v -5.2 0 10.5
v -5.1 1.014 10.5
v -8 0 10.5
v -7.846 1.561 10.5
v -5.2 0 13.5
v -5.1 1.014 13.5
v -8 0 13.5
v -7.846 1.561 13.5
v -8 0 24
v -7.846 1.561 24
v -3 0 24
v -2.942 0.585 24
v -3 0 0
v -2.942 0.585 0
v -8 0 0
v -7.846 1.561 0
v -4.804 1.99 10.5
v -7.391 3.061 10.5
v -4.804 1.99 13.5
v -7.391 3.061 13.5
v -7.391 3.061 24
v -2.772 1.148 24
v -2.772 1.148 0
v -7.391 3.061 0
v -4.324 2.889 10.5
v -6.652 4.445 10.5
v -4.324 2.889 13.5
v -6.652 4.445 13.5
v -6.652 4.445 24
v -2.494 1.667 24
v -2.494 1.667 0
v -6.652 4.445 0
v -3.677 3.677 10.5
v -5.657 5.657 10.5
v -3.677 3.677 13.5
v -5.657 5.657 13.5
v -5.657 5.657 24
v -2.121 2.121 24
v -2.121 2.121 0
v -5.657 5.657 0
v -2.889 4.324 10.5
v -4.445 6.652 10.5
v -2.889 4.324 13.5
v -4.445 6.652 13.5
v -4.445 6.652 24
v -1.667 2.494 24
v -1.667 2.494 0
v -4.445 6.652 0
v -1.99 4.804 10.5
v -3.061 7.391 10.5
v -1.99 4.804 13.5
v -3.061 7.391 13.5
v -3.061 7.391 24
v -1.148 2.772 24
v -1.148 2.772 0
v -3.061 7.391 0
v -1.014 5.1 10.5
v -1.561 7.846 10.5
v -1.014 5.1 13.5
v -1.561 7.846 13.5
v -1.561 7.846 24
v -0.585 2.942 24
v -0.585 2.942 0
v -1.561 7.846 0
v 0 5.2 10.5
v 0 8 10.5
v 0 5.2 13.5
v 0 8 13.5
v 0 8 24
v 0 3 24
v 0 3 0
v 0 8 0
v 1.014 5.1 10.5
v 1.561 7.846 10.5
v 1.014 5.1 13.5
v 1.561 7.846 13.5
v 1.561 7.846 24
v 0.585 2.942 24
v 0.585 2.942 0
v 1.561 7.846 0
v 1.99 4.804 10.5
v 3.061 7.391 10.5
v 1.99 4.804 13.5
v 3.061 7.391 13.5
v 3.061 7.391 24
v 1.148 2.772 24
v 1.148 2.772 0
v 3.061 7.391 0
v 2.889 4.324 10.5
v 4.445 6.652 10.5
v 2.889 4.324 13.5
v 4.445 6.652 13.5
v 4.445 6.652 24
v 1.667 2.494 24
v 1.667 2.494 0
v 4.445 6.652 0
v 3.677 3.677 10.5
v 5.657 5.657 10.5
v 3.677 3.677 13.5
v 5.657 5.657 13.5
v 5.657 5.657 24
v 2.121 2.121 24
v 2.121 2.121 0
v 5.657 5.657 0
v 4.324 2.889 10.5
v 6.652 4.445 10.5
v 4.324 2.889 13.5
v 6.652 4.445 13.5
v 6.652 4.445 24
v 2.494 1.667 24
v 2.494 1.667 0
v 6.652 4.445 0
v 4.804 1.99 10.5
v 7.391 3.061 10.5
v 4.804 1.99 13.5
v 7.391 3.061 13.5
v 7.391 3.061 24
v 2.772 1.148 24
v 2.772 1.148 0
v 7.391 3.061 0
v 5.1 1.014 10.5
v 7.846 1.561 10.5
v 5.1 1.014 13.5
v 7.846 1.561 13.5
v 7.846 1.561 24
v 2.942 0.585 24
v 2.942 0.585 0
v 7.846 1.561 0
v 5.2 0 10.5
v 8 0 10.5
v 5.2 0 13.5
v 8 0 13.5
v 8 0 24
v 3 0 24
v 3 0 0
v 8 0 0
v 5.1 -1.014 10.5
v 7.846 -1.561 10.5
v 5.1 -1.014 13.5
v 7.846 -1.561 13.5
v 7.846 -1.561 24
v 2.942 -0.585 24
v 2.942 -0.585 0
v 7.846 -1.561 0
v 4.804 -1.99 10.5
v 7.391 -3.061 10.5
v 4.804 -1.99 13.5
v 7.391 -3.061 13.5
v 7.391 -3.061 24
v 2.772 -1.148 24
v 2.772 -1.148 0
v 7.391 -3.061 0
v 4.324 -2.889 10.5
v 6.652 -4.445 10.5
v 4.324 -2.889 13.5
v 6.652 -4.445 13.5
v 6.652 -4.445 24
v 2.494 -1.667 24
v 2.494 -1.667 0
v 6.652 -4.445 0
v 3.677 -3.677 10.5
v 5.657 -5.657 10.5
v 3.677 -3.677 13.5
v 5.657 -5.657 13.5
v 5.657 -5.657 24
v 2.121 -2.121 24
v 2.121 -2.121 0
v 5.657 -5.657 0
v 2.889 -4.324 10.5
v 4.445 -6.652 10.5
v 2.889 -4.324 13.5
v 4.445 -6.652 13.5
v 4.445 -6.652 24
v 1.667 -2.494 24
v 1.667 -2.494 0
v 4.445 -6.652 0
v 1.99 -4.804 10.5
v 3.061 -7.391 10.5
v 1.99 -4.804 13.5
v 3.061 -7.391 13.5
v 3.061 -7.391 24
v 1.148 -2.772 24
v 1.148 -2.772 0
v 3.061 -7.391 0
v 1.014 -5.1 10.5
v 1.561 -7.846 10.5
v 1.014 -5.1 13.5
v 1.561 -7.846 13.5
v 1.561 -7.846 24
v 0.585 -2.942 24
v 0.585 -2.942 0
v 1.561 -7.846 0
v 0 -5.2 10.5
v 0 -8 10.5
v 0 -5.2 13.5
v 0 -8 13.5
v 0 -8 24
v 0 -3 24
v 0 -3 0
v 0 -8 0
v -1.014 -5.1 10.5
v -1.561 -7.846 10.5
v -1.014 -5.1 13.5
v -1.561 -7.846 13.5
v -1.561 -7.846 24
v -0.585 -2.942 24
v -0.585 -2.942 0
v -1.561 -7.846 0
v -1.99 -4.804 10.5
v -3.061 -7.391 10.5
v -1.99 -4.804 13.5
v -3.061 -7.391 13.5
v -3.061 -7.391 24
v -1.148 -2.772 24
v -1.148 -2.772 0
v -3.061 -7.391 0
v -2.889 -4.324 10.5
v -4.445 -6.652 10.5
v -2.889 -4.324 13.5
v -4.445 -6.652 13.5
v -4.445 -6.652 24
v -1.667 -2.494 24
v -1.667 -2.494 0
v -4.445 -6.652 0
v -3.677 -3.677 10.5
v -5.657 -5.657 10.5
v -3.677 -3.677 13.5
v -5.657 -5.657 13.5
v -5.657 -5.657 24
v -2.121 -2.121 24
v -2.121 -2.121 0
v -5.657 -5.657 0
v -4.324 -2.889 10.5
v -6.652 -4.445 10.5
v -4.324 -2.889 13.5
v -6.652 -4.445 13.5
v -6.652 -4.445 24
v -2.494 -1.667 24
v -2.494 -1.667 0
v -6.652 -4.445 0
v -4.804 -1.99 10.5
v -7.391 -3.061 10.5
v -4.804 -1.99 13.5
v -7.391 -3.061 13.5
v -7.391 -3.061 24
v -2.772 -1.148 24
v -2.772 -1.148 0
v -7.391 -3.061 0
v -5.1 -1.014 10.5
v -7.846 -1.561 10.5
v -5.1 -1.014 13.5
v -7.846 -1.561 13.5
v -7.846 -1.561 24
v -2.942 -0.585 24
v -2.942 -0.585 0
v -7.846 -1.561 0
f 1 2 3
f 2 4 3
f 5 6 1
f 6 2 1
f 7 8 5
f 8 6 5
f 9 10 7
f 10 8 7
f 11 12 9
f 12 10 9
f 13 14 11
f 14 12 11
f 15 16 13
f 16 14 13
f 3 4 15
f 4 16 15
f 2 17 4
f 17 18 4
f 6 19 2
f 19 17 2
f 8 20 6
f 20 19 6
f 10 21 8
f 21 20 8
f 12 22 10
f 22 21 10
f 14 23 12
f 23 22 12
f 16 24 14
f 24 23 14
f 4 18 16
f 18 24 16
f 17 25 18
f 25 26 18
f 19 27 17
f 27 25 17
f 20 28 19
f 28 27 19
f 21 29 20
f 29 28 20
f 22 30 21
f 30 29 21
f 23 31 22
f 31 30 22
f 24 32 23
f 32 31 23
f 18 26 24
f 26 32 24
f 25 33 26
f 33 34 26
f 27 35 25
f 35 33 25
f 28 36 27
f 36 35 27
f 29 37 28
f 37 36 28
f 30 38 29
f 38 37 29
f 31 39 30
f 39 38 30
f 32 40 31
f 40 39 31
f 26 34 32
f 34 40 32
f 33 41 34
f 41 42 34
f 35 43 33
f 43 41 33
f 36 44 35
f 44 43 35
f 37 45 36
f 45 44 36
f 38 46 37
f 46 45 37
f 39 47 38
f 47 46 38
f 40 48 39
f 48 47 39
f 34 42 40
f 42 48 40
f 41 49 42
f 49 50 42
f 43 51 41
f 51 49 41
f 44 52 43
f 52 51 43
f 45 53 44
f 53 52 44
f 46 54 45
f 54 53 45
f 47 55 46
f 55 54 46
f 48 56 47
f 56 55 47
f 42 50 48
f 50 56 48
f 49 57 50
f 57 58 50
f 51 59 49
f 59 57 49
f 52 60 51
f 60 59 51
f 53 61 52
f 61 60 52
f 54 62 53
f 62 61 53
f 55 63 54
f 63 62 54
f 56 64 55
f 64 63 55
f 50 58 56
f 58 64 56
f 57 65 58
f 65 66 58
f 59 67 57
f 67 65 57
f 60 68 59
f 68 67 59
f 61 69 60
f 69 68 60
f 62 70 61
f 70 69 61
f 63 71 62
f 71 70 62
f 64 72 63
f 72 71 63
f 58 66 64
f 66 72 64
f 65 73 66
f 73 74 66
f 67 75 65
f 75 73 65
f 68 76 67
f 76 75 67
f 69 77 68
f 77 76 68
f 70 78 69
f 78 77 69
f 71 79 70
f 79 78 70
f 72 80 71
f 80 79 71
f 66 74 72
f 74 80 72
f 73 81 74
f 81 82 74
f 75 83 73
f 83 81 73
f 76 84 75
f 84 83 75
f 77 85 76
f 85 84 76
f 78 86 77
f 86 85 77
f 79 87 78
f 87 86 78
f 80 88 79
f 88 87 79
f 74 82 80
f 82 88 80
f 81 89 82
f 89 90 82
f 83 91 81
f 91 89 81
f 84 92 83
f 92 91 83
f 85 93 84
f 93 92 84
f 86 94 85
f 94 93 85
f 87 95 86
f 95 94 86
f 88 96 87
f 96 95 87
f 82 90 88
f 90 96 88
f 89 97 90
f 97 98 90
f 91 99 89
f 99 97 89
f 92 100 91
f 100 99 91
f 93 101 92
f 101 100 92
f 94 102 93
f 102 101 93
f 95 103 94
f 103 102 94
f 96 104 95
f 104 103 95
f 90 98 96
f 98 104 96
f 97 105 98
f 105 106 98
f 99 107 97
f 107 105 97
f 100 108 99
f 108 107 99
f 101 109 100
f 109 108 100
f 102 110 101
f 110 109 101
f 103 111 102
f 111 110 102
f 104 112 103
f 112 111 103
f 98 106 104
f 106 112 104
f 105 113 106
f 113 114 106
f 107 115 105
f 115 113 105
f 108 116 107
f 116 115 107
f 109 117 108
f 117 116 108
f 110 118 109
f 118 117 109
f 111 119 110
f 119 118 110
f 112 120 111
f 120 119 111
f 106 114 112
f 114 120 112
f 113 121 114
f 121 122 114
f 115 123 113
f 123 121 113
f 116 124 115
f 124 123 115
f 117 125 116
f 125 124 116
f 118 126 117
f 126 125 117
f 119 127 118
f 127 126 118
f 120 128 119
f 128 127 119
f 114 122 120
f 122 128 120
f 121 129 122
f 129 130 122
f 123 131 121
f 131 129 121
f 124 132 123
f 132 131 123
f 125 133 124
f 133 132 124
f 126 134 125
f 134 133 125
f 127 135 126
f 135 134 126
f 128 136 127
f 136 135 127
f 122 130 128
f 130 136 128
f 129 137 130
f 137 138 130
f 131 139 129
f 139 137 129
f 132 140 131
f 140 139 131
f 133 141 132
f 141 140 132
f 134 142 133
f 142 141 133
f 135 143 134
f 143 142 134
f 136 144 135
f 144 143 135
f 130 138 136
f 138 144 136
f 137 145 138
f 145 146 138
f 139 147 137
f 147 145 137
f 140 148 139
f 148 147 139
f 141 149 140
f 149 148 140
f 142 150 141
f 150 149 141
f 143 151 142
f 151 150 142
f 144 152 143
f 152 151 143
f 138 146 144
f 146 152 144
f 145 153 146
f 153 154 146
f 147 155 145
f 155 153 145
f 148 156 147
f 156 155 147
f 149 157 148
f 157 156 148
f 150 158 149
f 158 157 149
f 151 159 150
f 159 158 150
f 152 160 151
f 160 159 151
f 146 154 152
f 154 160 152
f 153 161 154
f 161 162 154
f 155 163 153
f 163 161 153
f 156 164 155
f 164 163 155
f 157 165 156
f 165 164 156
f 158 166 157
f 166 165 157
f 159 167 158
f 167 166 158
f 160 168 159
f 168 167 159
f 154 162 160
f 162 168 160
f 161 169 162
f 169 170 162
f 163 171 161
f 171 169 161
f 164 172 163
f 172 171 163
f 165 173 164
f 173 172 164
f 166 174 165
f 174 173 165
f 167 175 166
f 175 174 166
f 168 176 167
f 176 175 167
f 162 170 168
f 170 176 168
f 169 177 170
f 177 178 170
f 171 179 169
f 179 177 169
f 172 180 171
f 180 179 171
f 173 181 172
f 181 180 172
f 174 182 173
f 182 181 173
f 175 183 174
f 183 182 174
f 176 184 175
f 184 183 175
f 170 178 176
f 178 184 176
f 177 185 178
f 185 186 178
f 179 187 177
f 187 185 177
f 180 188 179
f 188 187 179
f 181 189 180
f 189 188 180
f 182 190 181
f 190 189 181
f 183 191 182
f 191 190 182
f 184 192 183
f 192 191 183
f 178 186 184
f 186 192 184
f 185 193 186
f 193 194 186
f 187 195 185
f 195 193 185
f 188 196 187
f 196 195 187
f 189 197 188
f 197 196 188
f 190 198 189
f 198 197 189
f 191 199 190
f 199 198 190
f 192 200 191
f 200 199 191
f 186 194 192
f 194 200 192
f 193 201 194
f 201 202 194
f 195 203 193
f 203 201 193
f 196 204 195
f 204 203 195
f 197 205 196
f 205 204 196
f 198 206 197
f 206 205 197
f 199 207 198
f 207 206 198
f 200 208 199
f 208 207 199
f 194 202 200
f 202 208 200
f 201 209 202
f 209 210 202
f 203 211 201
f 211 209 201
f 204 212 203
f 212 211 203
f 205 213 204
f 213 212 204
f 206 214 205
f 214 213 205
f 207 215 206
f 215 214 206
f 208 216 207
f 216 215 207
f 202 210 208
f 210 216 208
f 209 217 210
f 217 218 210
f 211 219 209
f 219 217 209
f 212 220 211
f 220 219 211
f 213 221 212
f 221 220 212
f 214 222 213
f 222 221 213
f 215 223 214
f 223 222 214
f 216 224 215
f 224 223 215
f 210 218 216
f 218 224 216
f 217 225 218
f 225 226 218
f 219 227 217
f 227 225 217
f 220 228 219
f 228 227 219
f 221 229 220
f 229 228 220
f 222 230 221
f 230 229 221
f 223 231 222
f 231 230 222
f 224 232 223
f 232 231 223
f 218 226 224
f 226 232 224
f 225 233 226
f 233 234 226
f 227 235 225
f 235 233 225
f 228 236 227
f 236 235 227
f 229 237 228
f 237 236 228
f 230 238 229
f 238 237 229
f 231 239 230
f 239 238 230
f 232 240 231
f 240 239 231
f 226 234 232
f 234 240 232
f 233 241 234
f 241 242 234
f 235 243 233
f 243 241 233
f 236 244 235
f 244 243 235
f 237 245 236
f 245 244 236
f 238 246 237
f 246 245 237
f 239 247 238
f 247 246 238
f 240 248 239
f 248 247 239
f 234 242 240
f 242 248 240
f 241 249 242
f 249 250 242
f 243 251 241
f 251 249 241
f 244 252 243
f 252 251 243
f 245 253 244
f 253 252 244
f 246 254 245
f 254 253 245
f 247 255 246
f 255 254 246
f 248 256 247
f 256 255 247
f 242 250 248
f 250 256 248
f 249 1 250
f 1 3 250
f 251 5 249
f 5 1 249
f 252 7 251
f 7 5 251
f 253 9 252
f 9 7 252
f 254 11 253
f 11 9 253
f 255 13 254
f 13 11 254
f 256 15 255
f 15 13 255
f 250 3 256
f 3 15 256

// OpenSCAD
$fn = 32;

// ----------------------------------------------------------------------
// Grooved revolve: plain_grooves, bore R3
// ----------------------------------------------------------------------

// --- parameters (mm) ---
bore_r = 3;               // bore radius
outer_r = 8;              // outer radius of the body
total_h = 24;             // overall height, Z
wall = 5;                 // radial wall thickness
groove_w = 3;             // groove width
groove_d = 2.8;           // groove depth
grooves = 1;              // number of outer grooves
fit_tol = 0.02;           // declared fit tolerance (prompt contract)
free_tol = 0.2;           // declared free tolerance (prompt contract)

bbox_x = 2 * outer_r;  // full diameter
bore_d = 2 * bore_r;  // bore diameter
body_d = 2 * outer_r;  // body diameter
revolve_angle = 360;  // full turn around the Z axis

profile = [[3, 0], [8, 0], [8, 10.5], [5.2, 10.5], [5.2, 13.5], [8, 13.5], [8, 24], [3, 24]];  // primary outline, 8 points, counter clockwise

// --- the one profile operation ---
rotate_extrude(angle = revolve_angle) polygon(points = profile);
